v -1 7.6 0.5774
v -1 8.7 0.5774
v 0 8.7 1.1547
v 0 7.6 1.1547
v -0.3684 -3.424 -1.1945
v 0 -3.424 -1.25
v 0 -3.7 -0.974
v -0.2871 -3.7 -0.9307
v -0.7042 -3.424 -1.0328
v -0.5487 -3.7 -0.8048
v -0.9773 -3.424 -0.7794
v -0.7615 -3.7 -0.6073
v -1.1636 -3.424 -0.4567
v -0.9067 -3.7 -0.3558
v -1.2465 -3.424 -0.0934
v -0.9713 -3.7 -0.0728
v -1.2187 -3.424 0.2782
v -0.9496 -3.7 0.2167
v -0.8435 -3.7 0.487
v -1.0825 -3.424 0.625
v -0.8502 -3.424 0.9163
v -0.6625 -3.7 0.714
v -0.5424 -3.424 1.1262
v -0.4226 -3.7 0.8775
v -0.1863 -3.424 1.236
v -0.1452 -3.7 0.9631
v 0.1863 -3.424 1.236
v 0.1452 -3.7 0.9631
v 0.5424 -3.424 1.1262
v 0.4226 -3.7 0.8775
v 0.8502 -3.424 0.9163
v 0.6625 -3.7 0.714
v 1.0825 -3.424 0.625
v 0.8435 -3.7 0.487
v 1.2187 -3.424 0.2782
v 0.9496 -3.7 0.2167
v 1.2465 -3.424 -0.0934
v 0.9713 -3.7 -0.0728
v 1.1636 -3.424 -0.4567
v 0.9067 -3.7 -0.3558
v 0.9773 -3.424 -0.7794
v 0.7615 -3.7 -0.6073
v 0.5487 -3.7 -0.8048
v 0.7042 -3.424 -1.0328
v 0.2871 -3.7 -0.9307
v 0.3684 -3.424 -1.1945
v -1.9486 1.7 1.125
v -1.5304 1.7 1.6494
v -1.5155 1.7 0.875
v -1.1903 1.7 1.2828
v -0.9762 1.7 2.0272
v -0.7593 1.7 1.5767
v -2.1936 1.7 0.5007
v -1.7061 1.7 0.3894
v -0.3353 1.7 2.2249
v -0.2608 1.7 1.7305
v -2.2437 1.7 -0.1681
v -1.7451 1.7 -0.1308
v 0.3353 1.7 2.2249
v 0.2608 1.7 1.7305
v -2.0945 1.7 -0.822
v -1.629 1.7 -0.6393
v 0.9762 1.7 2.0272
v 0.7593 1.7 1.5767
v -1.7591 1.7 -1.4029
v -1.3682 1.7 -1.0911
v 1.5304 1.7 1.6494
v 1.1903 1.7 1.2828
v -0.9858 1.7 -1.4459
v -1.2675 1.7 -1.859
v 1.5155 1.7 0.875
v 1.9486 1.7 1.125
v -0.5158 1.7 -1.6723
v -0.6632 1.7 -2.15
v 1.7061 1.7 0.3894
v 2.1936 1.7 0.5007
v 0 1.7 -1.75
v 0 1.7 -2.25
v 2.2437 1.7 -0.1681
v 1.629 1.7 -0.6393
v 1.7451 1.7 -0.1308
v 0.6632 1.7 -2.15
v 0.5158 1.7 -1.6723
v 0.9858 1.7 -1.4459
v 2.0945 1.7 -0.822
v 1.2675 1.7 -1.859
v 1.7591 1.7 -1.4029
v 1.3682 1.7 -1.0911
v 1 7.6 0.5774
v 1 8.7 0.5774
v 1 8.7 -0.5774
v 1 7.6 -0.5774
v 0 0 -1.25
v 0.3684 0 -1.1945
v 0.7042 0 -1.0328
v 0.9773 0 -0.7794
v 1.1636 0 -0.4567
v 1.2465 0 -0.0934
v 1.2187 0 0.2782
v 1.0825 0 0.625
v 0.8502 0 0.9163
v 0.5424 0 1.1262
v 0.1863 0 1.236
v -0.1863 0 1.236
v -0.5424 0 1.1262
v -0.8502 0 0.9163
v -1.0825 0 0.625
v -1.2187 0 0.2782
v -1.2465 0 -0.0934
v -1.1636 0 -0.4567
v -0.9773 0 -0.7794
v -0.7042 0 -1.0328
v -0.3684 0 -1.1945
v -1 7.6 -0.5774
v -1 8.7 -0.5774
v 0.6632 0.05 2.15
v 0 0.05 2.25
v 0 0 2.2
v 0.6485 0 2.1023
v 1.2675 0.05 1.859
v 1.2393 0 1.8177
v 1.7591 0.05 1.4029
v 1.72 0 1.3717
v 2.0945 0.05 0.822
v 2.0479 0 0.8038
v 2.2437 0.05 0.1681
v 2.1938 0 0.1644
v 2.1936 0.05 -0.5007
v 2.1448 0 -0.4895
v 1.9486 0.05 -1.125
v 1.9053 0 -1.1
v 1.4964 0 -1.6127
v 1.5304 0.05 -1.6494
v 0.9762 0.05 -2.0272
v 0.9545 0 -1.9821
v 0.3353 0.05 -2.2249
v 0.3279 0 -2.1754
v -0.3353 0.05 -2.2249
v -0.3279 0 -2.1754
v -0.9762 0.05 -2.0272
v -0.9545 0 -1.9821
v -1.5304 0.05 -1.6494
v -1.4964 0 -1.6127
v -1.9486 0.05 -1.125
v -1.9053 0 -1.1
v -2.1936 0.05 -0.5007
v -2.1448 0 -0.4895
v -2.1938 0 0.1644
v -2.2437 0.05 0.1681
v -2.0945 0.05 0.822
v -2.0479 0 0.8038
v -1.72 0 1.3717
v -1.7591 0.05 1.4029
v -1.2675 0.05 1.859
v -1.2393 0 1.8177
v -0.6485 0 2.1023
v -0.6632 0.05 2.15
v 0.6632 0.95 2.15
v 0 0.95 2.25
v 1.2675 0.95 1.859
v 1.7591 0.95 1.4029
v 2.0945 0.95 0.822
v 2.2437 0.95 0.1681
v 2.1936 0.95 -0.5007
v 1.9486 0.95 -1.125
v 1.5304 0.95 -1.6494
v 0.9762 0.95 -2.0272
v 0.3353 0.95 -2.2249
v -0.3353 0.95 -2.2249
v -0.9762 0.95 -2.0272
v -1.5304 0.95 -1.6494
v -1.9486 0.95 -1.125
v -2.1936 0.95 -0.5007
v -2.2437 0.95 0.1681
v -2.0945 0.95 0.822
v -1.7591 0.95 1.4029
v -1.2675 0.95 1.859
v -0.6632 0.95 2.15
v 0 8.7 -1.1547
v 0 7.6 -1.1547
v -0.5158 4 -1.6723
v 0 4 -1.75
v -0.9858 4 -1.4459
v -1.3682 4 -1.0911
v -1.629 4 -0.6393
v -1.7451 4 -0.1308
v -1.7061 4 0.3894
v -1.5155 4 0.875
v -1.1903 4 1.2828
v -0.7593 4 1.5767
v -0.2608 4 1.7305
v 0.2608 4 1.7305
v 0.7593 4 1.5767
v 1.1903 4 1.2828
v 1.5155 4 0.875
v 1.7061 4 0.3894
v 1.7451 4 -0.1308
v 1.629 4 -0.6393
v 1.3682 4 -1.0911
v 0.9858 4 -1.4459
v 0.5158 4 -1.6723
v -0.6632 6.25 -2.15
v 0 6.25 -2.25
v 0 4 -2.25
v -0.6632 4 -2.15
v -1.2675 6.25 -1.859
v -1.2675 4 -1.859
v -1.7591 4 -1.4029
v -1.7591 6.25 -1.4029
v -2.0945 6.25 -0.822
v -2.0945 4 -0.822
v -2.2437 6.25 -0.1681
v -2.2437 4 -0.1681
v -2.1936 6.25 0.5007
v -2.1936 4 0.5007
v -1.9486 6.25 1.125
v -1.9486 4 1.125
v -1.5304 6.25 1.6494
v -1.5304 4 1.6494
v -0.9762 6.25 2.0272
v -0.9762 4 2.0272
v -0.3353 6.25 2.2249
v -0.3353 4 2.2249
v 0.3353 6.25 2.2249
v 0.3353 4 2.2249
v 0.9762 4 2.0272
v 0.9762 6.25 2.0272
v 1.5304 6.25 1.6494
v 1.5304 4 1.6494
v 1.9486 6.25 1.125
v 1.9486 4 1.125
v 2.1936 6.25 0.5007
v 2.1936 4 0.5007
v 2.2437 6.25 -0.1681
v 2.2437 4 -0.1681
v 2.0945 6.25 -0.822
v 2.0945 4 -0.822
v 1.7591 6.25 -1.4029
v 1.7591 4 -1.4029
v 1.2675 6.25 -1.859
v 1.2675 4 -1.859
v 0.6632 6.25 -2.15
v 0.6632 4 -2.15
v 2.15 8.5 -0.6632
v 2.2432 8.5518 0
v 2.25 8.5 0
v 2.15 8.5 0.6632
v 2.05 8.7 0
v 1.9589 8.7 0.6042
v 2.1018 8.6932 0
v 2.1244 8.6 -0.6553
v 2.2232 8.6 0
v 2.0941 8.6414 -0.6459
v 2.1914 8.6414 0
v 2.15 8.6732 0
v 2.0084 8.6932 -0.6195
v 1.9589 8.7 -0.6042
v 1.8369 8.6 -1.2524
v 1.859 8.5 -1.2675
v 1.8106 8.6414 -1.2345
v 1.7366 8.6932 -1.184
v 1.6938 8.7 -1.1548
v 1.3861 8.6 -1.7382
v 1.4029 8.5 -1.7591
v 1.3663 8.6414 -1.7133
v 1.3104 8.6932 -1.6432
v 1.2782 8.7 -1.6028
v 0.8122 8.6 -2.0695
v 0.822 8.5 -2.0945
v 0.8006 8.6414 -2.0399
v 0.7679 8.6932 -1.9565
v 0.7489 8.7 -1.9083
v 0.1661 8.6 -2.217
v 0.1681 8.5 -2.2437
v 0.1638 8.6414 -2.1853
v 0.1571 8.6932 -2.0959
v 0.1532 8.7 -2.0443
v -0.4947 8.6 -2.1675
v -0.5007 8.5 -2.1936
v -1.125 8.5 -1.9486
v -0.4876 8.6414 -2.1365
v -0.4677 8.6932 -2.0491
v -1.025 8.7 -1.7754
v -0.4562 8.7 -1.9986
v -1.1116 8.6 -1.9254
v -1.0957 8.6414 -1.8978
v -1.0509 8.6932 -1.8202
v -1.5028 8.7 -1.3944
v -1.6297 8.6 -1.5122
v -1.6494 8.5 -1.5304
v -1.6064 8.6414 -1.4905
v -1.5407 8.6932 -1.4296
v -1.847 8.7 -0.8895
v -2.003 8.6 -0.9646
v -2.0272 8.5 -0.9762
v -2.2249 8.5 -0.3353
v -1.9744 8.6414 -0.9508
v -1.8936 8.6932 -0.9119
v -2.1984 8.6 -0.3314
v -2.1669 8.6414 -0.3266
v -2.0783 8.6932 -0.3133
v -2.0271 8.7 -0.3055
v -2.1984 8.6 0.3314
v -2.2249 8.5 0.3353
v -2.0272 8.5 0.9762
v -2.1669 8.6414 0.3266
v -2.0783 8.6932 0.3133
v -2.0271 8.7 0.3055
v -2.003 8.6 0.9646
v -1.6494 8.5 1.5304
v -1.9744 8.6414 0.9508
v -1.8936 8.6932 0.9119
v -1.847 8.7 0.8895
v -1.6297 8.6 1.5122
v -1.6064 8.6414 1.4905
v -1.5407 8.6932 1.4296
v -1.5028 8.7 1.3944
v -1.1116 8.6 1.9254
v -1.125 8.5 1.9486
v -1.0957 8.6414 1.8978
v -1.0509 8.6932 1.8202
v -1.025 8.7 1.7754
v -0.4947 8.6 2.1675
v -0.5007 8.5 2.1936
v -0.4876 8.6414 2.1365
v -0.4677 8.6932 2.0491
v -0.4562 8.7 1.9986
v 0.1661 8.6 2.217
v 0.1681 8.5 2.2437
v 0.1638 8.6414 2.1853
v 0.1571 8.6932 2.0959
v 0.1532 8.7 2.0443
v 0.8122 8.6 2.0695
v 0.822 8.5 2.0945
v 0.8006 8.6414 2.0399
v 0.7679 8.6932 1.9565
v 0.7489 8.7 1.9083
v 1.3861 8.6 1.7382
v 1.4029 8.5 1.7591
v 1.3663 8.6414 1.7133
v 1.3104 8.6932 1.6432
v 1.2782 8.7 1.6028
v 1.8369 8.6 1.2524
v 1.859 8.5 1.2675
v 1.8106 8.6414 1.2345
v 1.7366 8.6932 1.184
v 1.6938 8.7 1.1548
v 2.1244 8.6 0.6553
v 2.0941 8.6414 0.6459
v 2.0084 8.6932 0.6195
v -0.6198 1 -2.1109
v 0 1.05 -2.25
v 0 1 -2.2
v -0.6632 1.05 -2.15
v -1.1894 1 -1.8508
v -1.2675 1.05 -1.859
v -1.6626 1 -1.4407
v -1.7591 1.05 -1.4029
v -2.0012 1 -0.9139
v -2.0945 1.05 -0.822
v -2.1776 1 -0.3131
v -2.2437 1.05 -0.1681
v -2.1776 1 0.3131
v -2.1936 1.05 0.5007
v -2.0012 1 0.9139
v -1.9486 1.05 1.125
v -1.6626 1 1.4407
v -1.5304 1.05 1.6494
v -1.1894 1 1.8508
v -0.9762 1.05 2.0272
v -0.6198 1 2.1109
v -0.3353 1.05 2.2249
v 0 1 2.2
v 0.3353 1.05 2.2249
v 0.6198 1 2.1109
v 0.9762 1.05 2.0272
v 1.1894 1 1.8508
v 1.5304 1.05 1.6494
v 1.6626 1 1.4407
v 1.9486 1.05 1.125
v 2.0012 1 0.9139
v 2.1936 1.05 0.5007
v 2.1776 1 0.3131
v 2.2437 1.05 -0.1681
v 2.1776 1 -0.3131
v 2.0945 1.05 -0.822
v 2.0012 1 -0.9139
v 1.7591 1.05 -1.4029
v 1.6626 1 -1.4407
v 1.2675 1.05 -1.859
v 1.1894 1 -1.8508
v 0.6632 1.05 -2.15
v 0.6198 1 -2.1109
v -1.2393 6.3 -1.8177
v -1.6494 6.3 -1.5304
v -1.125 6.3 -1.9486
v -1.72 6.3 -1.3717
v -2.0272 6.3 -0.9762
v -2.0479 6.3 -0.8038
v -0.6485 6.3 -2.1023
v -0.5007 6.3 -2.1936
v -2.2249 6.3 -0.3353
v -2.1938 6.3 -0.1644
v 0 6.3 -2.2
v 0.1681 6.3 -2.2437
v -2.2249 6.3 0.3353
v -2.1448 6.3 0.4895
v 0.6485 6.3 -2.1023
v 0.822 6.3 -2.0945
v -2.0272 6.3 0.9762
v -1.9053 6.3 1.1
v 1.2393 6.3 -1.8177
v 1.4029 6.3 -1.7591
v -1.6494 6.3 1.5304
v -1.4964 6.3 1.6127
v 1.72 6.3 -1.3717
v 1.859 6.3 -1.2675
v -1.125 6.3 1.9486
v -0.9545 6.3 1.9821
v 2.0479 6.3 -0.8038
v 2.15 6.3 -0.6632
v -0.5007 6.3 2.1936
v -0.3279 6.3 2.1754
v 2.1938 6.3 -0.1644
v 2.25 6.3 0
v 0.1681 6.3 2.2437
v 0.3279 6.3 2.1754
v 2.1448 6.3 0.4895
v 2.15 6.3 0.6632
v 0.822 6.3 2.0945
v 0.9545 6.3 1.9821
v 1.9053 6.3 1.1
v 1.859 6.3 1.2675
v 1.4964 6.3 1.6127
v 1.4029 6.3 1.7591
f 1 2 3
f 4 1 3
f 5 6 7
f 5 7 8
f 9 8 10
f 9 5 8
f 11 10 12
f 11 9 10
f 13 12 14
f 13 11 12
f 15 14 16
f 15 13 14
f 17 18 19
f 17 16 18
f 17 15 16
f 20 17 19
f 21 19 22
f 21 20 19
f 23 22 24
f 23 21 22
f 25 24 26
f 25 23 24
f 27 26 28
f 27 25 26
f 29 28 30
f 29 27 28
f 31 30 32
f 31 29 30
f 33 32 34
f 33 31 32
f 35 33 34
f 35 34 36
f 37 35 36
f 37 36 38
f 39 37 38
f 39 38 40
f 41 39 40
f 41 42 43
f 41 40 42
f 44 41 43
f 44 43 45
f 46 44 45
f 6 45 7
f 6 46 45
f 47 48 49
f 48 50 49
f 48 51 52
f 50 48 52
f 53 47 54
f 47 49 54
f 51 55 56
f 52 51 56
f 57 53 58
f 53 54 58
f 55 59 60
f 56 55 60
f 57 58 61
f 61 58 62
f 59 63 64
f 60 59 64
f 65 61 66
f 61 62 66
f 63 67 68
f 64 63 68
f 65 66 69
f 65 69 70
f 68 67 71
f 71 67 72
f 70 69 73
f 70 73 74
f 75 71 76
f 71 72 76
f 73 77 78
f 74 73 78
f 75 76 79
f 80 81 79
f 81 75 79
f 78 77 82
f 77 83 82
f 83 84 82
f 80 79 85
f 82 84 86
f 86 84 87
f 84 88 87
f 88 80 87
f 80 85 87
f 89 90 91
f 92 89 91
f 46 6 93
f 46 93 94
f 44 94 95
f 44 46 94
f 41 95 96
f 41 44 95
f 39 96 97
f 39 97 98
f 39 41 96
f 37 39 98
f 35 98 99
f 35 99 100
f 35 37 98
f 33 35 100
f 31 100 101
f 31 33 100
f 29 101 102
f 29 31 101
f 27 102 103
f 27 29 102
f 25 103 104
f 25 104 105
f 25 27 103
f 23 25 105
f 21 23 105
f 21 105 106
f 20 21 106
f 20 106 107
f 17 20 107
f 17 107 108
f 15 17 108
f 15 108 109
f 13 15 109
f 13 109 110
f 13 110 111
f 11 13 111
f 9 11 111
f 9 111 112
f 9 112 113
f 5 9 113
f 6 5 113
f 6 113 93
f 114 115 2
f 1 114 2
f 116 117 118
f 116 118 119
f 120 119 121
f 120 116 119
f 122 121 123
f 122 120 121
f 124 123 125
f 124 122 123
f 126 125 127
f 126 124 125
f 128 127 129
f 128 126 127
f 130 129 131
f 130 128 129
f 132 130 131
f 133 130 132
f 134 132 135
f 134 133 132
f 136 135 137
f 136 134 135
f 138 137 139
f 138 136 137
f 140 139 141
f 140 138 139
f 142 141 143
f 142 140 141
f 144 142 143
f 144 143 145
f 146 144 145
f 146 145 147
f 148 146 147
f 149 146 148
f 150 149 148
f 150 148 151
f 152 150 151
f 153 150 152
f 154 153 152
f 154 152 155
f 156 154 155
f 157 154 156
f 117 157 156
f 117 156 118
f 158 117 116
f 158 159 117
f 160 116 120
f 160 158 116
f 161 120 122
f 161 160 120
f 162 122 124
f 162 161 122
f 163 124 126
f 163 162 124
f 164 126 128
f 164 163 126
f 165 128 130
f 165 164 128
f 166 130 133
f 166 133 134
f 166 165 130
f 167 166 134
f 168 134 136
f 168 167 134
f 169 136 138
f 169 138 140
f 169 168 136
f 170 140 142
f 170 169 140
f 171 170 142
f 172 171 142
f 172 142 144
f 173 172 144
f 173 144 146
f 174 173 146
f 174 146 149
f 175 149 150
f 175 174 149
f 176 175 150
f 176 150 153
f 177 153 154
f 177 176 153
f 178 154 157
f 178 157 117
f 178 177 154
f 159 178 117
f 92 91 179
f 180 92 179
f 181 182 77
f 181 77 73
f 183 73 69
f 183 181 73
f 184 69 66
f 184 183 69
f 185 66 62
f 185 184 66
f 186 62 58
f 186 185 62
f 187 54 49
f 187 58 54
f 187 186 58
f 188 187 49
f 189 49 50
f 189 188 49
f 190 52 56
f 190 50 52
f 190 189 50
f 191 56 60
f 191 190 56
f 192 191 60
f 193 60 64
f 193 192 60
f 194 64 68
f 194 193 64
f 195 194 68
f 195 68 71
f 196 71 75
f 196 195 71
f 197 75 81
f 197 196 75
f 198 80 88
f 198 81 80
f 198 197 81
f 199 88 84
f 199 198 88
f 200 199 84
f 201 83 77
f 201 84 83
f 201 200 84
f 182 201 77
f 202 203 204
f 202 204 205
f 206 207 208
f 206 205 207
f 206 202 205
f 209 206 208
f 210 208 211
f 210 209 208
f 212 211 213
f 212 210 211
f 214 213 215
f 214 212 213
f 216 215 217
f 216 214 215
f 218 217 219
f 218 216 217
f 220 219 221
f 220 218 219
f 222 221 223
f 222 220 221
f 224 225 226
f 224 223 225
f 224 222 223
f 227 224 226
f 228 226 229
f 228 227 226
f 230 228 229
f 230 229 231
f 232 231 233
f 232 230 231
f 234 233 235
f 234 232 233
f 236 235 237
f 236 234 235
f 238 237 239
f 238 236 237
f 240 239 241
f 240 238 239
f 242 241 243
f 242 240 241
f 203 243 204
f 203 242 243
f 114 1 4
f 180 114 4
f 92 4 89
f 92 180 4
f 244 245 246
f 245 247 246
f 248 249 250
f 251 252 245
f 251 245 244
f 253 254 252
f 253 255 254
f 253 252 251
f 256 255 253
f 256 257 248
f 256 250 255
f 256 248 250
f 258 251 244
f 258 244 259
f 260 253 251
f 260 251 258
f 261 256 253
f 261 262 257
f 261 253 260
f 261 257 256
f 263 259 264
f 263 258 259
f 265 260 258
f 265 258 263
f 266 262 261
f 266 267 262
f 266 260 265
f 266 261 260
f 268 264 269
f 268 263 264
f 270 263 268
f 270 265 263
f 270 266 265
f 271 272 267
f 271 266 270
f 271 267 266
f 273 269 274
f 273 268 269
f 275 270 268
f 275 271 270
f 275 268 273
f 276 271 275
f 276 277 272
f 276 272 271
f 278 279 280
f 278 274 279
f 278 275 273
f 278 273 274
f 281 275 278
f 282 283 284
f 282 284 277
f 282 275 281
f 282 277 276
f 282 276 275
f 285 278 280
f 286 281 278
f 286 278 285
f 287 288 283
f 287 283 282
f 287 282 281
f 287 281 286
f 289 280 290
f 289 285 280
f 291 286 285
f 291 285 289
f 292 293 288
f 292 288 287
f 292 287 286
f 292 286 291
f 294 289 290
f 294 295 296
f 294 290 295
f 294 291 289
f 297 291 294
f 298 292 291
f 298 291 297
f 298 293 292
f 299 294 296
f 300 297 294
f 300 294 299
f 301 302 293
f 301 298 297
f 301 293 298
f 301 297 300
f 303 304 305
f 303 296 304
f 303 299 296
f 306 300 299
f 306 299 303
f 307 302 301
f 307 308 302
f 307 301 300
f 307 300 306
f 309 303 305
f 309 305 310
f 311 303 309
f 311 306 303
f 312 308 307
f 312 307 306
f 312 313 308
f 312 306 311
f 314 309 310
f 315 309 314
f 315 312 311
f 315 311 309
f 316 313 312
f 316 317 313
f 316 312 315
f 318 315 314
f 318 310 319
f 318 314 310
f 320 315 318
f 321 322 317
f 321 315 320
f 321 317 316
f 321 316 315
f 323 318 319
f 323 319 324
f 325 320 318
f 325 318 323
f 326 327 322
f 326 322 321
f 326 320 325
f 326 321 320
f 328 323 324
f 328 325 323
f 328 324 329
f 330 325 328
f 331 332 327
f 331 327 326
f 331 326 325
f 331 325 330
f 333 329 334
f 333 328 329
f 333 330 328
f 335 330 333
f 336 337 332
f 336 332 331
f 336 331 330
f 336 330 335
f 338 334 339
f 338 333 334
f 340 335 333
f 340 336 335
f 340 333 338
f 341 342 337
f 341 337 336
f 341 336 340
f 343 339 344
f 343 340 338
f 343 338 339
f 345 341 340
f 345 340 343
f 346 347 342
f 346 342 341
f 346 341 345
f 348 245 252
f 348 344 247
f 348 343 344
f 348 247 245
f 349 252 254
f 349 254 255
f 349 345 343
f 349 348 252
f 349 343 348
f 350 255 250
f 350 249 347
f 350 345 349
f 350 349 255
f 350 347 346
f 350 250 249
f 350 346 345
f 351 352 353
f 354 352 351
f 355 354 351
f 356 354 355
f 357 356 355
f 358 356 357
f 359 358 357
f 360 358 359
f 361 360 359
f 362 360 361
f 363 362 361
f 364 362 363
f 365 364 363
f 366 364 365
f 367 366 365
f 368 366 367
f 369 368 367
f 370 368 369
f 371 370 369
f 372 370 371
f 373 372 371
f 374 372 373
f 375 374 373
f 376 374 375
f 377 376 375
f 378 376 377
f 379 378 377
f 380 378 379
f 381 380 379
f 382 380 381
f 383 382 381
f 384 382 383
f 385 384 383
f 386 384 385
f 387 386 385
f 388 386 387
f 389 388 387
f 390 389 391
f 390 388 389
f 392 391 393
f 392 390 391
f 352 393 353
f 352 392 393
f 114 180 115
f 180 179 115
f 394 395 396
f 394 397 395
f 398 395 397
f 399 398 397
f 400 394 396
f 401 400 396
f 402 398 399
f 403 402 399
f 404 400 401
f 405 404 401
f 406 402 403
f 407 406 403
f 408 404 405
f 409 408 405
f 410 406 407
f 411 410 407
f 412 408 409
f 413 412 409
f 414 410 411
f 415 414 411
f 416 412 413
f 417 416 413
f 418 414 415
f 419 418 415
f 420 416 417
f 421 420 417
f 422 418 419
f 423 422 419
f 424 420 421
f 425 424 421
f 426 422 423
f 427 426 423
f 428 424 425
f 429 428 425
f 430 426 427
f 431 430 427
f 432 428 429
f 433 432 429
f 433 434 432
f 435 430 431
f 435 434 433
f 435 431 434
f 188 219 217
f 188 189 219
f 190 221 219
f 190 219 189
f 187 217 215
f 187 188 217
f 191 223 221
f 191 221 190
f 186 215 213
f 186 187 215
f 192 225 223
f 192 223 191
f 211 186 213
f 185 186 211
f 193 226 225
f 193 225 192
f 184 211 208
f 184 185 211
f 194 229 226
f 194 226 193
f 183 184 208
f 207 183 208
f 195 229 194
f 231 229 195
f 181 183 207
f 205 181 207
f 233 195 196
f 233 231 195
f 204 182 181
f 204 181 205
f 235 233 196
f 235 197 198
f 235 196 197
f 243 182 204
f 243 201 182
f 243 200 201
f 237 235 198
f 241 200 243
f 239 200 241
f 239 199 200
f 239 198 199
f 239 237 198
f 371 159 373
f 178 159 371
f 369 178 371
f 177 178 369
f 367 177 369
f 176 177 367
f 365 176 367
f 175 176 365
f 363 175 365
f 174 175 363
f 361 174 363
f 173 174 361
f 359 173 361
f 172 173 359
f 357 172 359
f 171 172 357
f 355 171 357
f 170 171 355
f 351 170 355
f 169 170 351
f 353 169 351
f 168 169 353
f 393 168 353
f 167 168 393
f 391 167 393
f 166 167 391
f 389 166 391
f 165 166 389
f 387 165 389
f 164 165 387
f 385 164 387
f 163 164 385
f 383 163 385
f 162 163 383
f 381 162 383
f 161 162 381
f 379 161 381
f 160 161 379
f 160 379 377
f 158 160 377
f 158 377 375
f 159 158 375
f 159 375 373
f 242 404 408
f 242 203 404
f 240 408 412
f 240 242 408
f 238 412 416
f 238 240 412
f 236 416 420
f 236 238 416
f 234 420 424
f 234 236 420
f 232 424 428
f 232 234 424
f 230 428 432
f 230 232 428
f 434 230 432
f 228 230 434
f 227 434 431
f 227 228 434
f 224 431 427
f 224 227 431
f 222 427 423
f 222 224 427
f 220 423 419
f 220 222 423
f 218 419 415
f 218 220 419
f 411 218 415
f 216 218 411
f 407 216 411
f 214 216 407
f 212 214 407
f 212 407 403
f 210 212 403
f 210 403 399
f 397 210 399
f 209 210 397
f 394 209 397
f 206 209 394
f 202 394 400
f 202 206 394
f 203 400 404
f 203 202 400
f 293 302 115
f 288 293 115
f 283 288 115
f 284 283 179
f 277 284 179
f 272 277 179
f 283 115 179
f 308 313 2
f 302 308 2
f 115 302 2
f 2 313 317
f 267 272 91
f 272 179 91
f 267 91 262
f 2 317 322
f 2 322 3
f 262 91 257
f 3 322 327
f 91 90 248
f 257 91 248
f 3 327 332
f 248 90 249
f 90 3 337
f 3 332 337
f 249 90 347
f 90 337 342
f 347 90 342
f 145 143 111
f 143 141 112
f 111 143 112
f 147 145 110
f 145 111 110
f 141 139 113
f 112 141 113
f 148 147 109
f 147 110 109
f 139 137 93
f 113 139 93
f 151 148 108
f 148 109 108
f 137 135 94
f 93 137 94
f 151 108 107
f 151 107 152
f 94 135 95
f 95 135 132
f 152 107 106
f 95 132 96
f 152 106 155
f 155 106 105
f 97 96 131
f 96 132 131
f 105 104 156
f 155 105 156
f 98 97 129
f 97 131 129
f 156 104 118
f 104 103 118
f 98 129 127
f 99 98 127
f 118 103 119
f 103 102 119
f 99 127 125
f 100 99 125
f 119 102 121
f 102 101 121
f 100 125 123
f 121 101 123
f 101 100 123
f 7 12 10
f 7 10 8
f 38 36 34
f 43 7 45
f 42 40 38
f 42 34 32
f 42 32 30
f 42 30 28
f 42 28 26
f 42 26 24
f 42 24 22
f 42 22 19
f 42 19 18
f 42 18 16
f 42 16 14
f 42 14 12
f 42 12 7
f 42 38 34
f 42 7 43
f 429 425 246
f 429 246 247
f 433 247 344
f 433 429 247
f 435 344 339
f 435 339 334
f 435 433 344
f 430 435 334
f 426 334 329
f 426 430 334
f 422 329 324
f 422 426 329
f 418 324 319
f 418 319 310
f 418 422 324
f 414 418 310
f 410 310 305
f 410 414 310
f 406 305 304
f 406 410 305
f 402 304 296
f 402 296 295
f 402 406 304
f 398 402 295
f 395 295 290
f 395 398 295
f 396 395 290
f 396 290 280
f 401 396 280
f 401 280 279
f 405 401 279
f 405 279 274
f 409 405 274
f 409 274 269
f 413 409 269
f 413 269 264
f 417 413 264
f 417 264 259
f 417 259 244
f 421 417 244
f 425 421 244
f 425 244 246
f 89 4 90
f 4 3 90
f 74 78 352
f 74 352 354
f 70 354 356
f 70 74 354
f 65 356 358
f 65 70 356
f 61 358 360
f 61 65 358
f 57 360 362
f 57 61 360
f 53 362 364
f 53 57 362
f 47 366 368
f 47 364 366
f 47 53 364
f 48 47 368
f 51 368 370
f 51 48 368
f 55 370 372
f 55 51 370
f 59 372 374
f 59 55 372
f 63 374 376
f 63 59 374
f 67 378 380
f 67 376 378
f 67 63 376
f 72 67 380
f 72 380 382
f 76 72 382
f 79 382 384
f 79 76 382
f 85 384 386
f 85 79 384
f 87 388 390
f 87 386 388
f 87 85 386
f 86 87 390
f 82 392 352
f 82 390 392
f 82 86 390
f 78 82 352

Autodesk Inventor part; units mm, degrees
sketch "Sketch_3" plane through (0, 0, 0) normal (1, 0, 0) x (0, 1, 0)
  line L0 (1, 0) -> (0, 0)
  line L1 (0, 0) -> (0, 2.2)
  line L2 (0, 2.2) -> (0.05, 2.25)
  line L3 (0.05, 2.25) -> (0.95, 2.25)
  line L4 (0.95, 2.25) -> (1, 2.2)
  line L5 (1, 2.2) -> (1, 0)
  line L6 (1, 0) -> (0, 0)
revolve "Revolution1" add sketch "Sketch_3" angle 360 about axis through (0, 1, 0) along (0, 1, 0)
sketch "Sketch_9" plane through (0, 0, 0) normal (1, 0, 0) x (0, 1, 0)
  line L0 (-100, 0) -> (100, 0)
  line L1 (6.3, -1.25) -> (1, -1.25)
  line L2 (1, -1.25) -> (1, -2.2)
  line L3 (1, -2.2) -> (1.05, -2.25)
  line L4 (1.05, -2.25) -> (1.7, -2.25)
  line L5 (1.7, -2.25) -> (1.7, -1.75)
  line L6 (1.7, -1.75) -> (4, -1.75)
  line L7 (4, -1.75) -> (4, -2.25)
  line L8 (4, -2.25) -> (6.25, -2.25)
  line L9 (6.25, -2.25) -> (6.3, -2.2)
  line L10 (6.3, -2.2) -> (6.3, -1.25)
revolve "Revolution2" add sketch "Sketch_9" angle 360 about axis through (0, -100, 0) along (0, -1, 0)
sketch "Sketch_6" plane through (0, 0, 0) normal (0, 0, 1) x (1, 0, 0)
  line L0 (0, -50) -> (0, 50)
  line L1 (0, 8.7) -> (2.05, 8.7)
  arc A0 (2.25, 8.5) -> (2.05, 8.7) centre (2.05, 8.5) ccw
  line L2 (2.25, 8.5) -> (2.25, 6.3)
  line L3 (2.25, 6.3) -> (0, 6.3)
  line L4 (0, 6.3) -> (0, 8.7)
revolve "Revolution3" add sketch "Sketch_6" angle 360 about axis through (0, -50, 0) along (0, -1, 0)
sketch "Sketch_7" plane through (0, 8.7, 0) normal (0, 1, 0) x (1, 0, 0)
  line L0 (-1, -0.5774) -> (0, -1.1547)
  line L1 (0, -1.1547) -> (1, -0.5774)
  line L2 (1, -0.5774) -> (1, 0.5774)
  line L3 (1, 0.5774) -> (0, 1.1547)
  line L4 (0, 1.1547) -> (-1, 0.5774)
  line L5 (-1, 0.5774) -> (-1, -0.5774)
extrude "Extrusion1" cut sketch "Sketch_7" against normal blind 1.1
sketch "Sketch_10" plane through (0, 0, 0) normal (1, 0, 0) x (0, 1, 0)
  line L0 (-3.7, 0) -> (6.3, 0)
  line L1 (6.3, 0) -> (6.3, -1.25)
  line L2 (6.3, -1.25) -> (-3.424, -1.25)
  line L3 (-3.424, -1.25) -> (-3.7, -0.974)
  line L4 (-3.7, -0.974) -> (-3.7, 0)
  line L5 (-3.7, 0) -> (6.3, 0)
revolve "Revolution4" add sketch "Sketch_10" angle 360 about axis through (0, -3.7, 0) along (0, -1, 0)
thread "Thread1" size "M2.5x0.45" class "6g" standard "ISO Metric profile" length 6.7723
ref_plane "AS_XY" through (0, 8.7, 0) normal (0, 1, 0) x (1, 0, 0)
ref_plane "AS_YZ" through (0, 8.7, 0) normal (1, 0, 0) x (0, 0, -1)
ref_plane "AS_ZX" through (0, 8.7, 0) normal (0, 0, -1) x (0, 1, 0)
ref_plane "hul_XY" through (0, 0, 0) normal (0, 1, 0) x (1, 0, 0)
ref_plane "hul_YZ" through (0, 0, 0) normal (1, 0, 0) x (0, 0, -1)
ref_plane "hul_ZX" through (0, 0, 0) normal (0, 0, -1) x (0, 1, 0)
ref_plane "s01_XY" through (0, 5.3, 0) normal (0, 1, 0) x (1, 0, 0)
ref_plane "s01_YZ" through (0, 5.3, 0) normal (1, 0, 0) x (0, 0, -1)
ref_plane "s01_ZX" through (0, 5.3, 0) normal (0, 0, -1) x (0, 1, 0)
properties part number "SCHUNK-5509536 Huelse MPG 40"
